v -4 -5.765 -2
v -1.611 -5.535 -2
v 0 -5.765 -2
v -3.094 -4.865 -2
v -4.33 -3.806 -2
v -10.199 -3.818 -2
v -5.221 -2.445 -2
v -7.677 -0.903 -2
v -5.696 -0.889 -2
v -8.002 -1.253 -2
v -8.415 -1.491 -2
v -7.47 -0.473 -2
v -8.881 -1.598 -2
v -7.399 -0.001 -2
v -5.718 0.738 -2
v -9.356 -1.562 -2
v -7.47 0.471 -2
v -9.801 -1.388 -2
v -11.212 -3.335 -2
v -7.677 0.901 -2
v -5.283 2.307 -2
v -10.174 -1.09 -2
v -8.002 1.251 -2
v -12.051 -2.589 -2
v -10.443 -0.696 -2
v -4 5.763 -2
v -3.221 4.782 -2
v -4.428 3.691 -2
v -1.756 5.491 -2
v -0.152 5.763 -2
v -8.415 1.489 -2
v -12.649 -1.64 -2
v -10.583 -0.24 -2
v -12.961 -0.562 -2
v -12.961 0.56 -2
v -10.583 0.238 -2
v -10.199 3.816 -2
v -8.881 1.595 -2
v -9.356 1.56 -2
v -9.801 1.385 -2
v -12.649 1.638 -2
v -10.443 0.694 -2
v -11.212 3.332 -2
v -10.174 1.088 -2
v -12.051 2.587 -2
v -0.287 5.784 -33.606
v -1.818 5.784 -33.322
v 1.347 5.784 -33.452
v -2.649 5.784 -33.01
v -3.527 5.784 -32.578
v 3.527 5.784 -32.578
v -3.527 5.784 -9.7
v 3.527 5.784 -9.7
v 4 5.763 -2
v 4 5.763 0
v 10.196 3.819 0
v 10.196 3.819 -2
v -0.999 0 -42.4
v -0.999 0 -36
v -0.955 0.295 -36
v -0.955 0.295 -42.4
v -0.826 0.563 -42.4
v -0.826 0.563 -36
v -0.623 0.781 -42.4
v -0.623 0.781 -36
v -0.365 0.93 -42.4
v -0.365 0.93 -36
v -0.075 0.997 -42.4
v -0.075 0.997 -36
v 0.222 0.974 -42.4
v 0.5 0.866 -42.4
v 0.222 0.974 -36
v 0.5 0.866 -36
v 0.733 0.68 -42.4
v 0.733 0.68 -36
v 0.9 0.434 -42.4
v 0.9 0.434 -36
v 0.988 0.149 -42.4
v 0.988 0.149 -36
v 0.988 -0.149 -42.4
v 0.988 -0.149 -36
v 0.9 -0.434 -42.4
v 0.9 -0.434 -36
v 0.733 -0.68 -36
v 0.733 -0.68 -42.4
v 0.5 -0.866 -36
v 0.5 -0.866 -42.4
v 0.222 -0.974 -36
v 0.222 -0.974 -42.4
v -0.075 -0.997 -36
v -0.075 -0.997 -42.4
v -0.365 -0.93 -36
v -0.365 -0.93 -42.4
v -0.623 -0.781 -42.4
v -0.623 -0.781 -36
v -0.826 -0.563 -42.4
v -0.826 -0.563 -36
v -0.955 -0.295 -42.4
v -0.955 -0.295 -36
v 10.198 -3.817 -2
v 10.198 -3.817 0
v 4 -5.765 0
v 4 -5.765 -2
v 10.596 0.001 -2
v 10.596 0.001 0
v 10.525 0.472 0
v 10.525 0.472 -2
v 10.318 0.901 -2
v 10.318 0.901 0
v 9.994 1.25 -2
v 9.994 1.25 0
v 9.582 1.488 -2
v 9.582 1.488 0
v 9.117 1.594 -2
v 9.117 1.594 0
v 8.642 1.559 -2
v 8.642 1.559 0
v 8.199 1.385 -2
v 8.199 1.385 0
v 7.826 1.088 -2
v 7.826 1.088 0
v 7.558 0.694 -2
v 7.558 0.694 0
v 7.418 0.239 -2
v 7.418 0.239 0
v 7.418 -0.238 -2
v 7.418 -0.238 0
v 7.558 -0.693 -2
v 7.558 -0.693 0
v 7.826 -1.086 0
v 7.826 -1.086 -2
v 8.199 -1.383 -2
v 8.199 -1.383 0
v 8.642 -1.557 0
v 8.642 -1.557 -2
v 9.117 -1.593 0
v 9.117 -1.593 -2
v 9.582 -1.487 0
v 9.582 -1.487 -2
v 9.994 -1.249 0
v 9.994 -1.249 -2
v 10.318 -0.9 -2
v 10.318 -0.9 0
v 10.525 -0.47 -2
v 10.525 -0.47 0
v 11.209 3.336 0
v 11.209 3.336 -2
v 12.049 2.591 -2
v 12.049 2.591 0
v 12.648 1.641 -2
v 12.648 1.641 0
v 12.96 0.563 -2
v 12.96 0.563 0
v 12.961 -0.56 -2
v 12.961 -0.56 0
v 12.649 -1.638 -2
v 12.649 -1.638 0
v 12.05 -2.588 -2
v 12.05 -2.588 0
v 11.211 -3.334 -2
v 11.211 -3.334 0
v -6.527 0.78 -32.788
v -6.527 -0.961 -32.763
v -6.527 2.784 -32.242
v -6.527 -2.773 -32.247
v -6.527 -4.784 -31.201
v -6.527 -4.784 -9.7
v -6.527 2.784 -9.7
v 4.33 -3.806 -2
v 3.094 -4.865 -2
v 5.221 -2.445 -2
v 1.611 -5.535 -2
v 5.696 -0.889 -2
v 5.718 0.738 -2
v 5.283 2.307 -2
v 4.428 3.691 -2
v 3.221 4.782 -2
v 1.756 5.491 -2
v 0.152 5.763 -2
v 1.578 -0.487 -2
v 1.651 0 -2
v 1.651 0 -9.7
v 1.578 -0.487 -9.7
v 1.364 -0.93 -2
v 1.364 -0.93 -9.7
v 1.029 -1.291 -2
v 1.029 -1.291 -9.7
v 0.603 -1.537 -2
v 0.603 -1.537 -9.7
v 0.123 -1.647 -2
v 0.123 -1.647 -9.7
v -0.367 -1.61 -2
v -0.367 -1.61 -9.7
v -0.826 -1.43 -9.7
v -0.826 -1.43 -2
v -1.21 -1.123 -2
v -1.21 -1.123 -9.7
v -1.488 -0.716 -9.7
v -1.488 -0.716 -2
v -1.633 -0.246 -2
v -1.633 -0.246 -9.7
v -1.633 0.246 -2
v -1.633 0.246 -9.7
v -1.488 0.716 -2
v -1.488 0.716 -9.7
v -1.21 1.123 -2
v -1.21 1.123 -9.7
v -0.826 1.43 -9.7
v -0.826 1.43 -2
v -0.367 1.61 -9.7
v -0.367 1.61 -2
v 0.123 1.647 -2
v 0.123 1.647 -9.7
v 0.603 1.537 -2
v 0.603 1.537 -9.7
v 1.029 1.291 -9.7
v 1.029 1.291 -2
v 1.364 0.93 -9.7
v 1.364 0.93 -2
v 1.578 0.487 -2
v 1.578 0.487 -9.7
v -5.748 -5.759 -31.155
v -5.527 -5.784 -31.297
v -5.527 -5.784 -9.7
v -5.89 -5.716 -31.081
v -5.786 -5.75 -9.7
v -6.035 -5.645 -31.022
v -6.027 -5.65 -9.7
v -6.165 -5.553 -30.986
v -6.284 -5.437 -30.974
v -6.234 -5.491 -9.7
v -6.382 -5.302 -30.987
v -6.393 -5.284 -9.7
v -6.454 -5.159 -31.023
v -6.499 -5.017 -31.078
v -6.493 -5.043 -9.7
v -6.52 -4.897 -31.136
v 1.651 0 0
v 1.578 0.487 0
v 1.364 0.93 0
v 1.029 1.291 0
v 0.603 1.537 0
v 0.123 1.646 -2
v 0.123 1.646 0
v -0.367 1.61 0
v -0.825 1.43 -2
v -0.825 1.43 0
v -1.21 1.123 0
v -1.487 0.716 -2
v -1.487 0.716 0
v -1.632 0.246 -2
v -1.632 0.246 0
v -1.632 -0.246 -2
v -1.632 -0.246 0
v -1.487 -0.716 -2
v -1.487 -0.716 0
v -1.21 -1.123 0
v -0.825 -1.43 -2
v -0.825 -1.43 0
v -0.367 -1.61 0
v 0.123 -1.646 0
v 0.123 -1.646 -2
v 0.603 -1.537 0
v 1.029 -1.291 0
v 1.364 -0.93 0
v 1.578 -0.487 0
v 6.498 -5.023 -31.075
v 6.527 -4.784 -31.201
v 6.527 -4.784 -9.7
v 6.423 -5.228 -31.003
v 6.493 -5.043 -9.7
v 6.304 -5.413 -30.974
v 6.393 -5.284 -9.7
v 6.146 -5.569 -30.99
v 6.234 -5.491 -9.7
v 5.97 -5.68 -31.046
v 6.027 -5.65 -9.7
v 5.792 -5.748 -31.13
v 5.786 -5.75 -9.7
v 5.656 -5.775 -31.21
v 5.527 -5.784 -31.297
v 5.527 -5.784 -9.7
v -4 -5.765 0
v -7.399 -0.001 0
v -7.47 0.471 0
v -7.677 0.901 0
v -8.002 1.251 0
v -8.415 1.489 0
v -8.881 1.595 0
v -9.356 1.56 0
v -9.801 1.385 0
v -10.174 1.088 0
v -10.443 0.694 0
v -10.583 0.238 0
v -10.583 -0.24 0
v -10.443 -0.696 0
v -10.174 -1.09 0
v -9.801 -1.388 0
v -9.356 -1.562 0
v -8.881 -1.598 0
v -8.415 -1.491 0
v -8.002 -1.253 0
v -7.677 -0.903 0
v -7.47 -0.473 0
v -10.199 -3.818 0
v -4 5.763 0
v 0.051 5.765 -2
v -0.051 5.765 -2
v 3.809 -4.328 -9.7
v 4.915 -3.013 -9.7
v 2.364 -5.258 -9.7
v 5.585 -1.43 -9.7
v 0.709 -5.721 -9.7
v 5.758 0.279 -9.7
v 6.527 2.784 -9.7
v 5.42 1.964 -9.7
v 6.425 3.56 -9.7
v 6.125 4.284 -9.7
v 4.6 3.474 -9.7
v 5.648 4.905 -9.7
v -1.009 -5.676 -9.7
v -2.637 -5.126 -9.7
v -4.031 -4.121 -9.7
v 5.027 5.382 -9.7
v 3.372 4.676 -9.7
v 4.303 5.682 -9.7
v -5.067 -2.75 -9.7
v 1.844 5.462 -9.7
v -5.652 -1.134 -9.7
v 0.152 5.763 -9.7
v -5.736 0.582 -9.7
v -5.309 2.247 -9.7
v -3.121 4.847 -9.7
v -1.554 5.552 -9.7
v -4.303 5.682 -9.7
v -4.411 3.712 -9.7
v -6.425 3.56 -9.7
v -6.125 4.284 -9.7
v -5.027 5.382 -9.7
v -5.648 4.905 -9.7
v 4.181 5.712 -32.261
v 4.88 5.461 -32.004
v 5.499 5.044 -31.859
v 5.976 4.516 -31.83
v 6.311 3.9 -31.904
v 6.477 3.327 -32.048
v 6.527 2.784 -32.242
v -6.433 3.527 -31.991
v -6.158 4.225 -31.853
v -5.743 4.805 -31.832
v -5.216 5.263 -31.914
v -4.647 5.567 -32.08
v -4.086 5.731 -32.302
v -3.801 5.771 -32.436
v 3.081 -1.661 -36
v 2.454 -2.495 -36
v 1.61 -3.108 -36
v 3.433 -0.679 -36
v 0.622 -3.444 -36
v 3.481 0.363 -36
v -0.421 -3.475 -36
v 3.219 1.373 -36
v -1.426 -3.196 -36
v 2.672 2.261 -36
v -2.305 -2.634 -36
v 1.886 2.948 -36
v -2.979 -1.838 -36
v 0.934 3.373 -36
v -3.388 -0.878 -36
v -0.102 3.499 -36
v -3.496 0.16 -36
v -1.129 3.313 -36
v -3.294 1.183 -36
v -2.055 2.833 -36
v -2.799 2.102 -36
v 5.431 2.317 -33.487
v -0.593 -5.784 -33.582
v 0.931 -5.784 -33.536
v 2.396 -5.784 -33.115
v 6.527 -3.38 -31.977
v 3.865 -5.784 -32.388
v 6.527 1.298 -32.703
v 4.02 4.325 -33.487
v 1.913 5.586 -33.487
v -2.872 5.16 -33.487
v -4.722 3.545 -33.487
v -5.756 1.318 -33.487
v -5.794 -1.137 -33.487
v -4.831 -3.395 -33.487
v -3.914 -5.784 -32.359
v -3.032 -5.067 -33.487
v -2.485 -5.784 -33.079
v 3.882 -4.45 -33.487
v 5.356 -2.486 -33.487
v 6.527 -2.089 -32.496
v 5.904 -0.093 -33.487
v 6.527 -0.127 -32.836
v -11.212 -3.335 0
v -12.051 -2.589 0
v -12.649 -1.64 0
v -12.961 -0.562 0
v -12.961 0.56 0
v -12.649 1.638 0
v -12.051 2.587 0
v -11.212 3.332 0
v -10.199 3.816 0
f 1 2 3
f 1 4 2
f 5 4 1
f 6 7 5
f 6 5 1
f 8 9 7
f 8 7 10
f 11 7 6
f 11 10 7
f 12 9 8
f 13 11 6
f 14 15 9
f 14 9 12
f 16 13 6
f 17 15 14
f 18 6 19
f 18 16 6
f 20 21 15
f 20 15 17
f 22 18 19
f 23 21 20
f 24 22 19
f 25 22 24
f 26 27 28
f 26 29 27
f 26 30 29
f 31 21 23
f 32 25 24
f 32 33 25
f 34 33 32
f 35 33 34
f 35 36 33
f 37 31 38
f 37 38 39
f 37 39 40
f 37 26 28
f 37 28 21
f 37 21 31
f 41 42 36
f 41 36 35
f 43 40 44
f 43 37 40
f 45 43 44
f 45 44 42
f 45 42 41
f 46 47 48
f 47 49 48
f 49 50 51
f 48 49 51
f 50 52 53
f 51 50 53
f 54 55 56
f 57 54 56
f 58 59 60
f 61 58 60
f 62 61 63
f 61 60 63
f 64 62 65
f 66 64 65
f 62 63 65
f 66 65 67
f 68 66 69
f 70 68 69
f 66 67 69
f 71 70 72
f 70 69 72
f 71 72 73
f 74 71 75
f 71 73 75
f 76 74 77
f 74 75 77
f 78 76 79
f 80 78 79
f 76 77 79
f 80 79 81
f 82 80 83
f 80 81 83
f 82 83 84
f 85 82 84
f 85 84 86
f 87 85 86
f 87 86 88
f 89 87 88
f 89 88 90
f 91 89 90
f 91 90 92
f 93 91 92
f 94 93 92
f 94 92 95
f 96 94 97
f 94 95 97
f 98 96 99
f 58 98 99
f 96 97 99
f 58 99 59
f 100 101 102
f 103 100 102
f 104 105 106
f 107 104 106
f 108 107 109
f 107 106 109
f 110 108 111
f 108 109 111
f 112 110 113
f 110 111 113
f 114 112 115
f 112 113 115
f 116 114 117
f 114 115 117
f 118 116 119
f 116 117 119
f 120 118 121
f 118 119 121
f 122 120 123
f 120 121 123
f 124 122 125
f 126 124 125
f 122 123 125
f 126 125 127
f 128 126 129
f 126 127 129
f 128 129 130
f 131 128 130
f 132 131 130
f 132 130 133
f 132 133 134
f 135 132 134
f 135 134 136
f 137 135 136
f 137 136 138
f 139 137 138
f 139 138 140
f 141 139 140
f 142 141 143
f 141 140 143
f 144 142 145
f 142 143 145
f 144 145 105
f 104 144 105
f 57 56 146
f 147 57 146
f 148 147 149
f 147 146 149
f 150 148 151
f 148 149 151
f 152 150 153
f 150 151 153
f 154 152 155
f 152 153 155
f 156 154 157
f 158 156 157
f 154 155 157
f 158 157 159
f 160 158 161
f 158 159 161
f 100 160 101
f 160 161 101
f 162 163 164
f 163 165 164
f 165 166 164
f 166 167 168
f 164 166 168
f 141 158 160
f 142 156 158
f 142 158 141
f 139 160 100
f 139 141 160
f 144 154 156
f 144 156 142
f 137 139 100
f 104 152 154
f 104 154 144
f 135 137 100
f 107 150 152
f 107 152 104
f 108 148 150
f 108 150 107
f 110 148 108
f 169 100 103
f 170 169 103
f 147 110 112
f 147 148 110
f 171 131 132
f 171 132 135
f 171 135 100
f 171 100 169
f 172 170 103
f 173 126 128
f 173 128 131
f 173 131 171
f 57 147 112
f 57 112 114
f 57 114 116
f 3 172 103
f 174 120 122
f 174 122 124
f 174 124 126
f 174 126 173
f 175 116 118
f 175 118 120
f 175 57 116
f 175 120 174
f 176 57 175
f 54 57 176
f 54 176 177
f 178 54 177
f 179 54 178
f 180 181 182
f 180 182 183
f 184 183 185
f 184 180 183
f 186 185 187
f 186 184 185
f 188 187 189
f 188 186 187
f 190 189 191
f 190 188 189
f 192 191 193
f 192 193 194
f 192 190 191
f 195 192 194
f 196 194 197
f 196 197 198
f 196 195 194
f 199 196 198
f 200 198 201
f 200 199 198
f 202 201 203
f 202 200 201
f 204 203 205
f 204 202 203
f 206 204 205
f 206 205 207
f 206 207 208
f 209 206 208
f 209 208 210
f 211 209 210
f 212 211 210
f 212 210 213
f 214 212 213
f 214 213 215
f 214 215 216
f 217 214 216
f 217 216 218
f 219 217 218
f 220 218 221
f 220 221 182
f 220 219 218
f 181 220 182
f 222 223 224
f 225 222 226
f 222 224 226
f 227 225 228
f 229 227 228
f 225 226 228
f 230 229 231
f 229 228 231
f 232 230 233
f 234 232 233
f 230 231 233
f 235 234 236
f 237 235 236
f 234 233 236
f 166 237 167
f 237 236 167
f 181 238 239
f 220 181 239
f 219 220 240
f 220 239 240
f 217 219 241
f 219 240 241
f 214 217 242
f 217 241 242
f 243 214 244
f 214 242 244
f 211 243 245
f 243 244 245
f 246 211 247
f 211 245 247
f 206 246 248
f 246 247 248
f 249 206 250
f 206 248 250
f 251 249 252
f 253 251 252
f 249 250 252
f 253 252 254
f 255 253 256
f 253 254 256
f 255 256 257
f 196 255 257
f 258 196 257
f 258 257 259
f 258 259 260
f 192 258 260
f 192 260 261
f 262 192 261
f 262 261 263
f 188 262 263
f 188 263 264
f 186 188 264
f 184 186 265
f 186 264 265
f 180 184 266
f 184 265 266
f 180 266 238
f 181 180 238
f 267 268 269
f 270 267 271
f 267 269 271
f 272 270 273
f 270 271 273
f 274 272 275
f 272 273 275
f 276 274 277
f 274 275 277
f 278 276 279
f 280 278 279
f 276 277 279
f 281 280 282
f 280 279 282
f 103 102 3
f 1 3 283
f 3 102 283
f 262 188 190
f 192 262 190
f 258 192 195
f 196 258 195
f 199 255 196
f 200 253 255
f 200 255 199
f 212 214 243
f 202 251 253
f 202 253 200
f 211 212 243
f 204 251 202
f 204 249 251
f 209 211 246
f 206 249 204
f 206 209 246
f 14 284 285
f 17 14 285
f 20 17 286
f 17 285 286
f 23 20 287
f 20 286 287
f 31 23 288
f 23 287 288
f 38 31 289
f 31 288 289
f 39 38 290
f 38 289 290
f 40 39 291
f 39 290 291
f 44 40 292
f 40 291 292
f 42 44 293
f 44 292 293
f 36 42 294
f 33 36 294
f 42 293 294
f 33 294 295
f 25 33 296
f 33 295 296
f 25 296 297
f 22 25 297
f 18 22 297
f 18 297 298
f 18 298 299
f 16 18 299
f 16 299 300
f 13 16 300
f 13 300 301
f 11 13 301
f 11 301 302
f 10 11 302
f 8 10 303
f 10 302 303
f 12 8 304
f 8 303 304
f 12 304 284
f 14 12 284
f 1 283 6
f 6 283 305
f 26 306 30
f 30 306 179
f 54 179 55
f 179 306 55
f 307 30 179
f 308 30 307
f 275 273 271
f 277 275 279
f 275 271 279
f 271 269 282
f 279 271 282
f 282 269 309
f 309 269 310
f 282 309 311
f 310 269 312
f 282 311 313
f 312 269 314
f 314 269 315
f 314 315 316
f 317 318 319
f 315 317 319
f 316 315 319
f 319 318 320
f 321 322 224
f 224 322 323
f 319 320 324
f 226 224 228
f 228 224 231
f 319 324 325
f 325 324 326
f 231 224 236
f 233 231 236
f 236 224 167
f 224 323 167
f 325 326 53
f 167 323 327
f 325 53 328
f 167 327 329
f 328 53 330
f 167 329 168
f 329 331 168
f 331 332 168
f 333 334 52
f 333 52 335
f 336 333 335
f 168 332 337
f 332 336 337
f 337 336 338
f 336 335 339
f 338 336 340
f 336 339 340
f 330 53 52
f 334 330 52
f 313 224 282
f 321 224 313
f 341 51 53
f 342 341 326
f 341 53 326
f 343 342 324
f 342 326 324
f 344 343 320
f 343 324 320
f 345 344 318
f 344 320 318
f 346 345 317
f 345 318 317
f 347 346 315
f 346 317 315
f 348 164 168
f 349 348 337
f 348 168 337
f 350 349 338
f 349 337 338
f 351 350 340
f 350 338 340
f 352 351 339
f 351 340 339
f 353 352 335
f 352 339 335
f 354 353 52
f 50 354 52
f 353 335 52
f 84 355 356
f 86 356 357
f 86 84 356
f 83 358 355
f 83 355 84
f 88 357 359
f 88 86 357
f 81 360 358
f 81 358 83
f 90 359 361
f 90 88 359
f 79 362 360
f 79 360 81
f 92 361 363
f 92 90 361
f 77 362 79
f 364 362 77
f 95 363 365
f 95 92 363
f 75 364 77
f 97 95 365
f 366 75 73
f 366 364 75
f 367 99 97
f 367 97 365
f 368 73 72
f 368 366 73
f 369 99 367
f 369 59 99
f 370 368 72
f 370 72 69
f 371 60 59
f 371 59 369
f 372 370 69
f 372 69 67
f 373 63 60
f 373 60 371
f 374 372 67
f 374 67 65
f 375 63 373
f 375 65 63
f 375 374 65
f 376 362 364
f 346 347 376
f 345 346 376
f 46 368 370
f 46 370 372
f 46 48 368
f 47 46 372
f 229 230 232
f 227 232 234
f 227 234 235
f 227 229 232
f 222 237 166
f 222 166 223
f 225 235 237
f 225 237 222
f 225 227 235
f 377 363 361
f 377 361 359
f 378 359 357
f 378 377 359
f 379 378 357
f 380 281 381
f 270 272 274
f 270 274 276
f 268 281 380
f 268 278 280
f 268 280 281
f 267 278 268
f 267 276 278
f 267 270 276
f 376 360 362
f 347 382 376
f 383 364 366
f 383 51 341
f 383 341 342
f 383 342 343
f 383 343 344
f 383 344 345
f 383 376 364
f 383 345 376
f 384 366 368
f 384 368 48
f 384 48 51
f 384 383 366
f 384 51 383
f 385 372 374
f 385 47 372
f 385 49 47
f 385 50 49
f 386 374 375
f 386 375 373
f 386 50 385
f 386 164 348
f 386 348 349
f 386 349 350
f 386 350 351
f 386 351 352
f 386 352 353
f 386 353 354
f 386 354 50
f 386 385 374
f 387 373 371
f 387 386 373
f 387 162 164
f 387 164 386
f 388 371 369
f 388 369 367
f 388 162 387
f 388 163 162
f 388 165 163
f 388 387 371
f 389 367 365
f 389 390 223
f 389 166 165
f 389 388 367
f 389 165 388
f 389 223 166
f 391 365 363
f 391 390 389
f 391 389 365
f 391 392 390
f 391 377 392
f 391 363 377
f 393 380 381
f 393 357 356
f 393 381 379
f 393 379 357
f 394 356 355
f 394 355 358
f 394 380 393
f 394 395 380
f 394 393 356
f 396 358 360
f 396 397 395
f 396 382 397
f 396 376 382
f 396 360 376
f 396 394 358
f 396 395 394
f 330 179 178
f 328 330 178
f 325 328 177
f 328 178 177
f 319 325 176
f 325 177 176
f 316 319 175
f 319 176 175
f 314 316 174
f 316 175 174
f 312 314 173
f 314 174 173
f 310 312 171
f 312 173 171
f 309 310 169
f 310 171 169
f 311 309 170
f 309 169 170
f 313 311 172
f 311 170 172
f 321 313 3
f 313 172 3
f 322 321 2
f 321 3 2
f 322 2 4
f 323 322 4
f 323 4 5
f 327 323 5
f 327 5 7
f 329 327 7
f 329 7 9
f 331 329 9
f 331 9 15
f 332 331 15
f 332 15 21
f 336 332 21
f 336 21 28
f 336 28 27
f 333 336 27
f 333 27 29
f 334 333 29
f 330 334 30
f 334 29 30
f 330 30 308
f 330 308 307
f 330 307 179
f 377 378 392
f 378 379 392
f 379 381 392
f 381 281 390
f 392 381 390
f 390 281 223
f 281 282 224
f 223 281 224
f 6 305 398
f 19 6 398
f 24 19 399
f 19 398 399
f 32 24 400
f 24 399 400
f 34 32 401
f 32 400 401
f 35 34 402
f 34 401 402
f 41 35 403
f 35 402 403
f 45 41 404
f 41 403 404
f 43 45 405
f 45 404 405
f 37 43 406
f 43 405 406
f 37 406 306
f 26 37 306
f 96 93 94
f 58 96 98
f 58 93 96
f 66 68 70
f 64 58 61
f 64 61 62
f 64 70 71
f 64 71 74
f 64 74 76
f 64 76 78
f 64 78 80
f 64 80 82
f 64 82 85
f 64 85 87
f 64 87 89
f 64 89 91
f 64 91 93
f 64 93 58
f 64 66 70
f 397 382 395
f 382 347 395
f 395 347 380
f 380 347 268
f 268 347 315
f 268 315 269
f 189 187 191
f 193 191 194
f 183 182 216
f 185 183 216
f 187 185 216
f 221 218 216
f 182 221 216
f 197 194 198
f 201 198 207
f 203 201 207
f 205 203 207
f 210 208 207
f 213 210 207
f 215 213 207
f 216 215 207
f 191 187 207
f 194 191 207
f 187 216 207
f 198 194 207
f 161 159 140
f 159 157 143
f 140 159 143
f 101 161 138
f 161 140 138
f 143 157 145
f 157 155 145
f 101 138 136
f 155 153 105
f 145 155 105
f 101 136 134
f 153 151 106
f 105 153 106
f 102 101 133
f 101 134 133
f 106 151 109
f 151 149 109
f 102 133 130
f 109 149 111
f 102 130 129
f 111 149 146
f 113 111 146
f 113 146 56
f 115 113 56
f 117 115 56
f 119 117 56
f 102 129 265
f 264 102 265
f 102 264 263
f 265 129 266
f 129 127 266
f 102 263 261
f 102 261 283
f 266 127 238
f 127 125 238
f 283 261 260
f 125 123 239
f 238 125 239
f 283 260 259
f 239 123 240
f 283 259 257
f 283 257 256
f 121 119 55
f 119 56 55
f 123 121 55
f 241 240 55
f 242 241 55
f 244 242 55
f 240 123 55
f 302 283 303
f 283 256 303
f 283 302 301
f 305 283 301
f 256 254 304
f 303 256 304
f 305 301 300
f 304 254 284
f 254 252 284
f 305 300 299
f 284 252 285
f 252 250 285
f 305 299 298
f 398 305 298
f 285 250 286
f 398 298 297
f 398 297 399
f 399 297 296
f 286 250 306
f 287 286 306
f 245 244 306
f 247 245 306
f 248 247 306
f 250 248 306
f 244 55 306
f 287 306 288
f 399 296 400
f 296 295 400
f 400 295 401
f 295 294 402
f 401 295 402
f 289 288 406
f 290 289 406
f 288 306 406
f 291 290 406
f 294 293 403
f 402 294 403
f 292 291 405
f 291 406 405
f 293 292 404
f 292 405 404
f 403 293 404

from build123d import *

# Parameters (mm, degrees)
CROQUIS1_R               = 1.598160281
CROQUIS1_R_2             = 1.600993429
CROQUIS1_R_3             = 1.650918845
SALIENTE_EXTRUIR7_DEPTH  = 2
CROQUIS2_R               = 5.764999893
CROQUIS2_R_2             = 1.651186543
SALIENTE_EXTRUIR8_DEPTH  = 7.7
SALIENTE_EXTRUIR9_DEPTH  = 26.3
CROQUIS6_R               = 0.999415005
SALIENTE_EXTRUIR10_DEPTH = 6.4


with BuildPart() as part:
    # Croquis1 → Saliente-Extruir7 (new body)
    with BuildSketch(Plane.XY):
        with BuildLine():
            Line((4.00000019, 5.763000809), (10.195969576, 3.8191034))
            ThreePointArc((10.195969576, 3.8191034), (12.999977706, 0.001566069), (10.197782, -3.817301838))
            Line((10.197782, -3.817301838), (4.00000019, -5.764999893))
            Line((4.00000019, -5.764999893), (-4.00000019, -5.764999893))
            Line((-4.00000019, -5.764999893), (-10.199065979, -3.817665654))
            ThreePointArc((-10.199065979, -3.817665654), (-13.000622723, -0.001109837), (-10.199143851, 3.815503142))
            Line((-10.199143851, 3.815503142), (-4.00000019, 5.763000809))
            Line((-4.00000019, 5.763000809), (4.00000019, 5.763000809))
        make_face()
        with Locations((8.997973452, 0.000616233)):
            Circle(CROQUIS1_R, mode=Mode.SUBTRACT)
        with Locations((-9.000145119, -0.001069025)):
            Circle(CROQUIS1_R_2, mode=Mode.SUBTRACT)
        Circle(CROQUIS1_R_3, mode=Mode.SUBTRACT)
    extrude(amount=-SALIENTE_EXTRUIR7_DEPTH)

    # Croquis2 → Saliente-Extruir8 (add)
    with BuildSketch(Plane(origin=(0, 0, -2), x_dir=(-1, 0, 0), z_dir=(0, 0, -1))):
        with Locations(Location((0, 0, 0), (0, 0, 91.508919394))):
            Circle(CROQUIS2_R)
        with Locations(Location((0, 0, 0), (0, 0, 180))):
            Circle(CROQUIS2_R_2, mode=Mode.SUBTRACT)
    extrude(amount=SALIENTE_EXTRUIR8_DEPTH)

    # Croquis3 → Saliente-Extruir9 (add)
    with BuildSketch(Plane(origin=(0, 0, -9.7), x_dir=(-1, 0, 0), z_dir=(0, 0, -1))):
        with BuildLine():
            Line((3.526868458, 5.783774708), (-3.526868458, 5.783774708))
            ThreePointArc((-3.526868458, 5.783774708), (-5.648188802, 4.905095052), (-6.526868458, 2.783774708))
            Line((-6.526868458, 2.783774708), (-6.526868458, -4.783774708))
            ThreePointArc((-6.526868458, -4.783774708), (-6.233975239, -5.490881489), (-5.526868458, -5.783774708))
            Line((-5.526868458, -5.783774708), (5.526868458, -5.783774708))
            ThreePointArc((5.526868458, -5.783774708), (6.233975239, -5.490881489), (6.526868458, -4.783774708))
            Line((6.526868458, -4.783774708), (6.526868458, 2.783774708))
            ThreePointArc((6.526868458, 2.783774708), (5.648188802, 4.905095052), (3.526868458, 5.783774708))
        make_face()
    extrude(amount=SALIENTE_EXTRUIR9_DEPTH)

    # Croquis5 → Cortar-Revolución1 (revolve, cut)
    with BuildSketch(Plane(origin=(0, 0, 0), x_dir=(1, 0, 0), z_dir=(0, 1, 0)), mode=Mode.PRIVATE) as cortar_revoluci_n1_sk:
        Polygon((-3.5, 36), (-8.472559386, 30.803521887), (-8.472559386, 36), align=None)
    revolve(cortar_revoluci_n1_sk.sketch.rotate(Axis((0, 0, -39.9199001), (0, 0, 1)), 203.098732746), axis=Axis((0, 0, -39.9199001), (0, 0, 1)), mode=Mode.SUBTRACT)

    # Croquis6 → Saliente-Extruir10 (add)
    with BuildSketch(Plane(origin=(0, 0, -36), x_dir=(-1, 0, 0), z_dir=(0, 0, -1))):
        Circle(CROQUIS6_R)
    extrude(amount=SALIENTE_EXTRUIR10_DEPTH)


solid = part.part
